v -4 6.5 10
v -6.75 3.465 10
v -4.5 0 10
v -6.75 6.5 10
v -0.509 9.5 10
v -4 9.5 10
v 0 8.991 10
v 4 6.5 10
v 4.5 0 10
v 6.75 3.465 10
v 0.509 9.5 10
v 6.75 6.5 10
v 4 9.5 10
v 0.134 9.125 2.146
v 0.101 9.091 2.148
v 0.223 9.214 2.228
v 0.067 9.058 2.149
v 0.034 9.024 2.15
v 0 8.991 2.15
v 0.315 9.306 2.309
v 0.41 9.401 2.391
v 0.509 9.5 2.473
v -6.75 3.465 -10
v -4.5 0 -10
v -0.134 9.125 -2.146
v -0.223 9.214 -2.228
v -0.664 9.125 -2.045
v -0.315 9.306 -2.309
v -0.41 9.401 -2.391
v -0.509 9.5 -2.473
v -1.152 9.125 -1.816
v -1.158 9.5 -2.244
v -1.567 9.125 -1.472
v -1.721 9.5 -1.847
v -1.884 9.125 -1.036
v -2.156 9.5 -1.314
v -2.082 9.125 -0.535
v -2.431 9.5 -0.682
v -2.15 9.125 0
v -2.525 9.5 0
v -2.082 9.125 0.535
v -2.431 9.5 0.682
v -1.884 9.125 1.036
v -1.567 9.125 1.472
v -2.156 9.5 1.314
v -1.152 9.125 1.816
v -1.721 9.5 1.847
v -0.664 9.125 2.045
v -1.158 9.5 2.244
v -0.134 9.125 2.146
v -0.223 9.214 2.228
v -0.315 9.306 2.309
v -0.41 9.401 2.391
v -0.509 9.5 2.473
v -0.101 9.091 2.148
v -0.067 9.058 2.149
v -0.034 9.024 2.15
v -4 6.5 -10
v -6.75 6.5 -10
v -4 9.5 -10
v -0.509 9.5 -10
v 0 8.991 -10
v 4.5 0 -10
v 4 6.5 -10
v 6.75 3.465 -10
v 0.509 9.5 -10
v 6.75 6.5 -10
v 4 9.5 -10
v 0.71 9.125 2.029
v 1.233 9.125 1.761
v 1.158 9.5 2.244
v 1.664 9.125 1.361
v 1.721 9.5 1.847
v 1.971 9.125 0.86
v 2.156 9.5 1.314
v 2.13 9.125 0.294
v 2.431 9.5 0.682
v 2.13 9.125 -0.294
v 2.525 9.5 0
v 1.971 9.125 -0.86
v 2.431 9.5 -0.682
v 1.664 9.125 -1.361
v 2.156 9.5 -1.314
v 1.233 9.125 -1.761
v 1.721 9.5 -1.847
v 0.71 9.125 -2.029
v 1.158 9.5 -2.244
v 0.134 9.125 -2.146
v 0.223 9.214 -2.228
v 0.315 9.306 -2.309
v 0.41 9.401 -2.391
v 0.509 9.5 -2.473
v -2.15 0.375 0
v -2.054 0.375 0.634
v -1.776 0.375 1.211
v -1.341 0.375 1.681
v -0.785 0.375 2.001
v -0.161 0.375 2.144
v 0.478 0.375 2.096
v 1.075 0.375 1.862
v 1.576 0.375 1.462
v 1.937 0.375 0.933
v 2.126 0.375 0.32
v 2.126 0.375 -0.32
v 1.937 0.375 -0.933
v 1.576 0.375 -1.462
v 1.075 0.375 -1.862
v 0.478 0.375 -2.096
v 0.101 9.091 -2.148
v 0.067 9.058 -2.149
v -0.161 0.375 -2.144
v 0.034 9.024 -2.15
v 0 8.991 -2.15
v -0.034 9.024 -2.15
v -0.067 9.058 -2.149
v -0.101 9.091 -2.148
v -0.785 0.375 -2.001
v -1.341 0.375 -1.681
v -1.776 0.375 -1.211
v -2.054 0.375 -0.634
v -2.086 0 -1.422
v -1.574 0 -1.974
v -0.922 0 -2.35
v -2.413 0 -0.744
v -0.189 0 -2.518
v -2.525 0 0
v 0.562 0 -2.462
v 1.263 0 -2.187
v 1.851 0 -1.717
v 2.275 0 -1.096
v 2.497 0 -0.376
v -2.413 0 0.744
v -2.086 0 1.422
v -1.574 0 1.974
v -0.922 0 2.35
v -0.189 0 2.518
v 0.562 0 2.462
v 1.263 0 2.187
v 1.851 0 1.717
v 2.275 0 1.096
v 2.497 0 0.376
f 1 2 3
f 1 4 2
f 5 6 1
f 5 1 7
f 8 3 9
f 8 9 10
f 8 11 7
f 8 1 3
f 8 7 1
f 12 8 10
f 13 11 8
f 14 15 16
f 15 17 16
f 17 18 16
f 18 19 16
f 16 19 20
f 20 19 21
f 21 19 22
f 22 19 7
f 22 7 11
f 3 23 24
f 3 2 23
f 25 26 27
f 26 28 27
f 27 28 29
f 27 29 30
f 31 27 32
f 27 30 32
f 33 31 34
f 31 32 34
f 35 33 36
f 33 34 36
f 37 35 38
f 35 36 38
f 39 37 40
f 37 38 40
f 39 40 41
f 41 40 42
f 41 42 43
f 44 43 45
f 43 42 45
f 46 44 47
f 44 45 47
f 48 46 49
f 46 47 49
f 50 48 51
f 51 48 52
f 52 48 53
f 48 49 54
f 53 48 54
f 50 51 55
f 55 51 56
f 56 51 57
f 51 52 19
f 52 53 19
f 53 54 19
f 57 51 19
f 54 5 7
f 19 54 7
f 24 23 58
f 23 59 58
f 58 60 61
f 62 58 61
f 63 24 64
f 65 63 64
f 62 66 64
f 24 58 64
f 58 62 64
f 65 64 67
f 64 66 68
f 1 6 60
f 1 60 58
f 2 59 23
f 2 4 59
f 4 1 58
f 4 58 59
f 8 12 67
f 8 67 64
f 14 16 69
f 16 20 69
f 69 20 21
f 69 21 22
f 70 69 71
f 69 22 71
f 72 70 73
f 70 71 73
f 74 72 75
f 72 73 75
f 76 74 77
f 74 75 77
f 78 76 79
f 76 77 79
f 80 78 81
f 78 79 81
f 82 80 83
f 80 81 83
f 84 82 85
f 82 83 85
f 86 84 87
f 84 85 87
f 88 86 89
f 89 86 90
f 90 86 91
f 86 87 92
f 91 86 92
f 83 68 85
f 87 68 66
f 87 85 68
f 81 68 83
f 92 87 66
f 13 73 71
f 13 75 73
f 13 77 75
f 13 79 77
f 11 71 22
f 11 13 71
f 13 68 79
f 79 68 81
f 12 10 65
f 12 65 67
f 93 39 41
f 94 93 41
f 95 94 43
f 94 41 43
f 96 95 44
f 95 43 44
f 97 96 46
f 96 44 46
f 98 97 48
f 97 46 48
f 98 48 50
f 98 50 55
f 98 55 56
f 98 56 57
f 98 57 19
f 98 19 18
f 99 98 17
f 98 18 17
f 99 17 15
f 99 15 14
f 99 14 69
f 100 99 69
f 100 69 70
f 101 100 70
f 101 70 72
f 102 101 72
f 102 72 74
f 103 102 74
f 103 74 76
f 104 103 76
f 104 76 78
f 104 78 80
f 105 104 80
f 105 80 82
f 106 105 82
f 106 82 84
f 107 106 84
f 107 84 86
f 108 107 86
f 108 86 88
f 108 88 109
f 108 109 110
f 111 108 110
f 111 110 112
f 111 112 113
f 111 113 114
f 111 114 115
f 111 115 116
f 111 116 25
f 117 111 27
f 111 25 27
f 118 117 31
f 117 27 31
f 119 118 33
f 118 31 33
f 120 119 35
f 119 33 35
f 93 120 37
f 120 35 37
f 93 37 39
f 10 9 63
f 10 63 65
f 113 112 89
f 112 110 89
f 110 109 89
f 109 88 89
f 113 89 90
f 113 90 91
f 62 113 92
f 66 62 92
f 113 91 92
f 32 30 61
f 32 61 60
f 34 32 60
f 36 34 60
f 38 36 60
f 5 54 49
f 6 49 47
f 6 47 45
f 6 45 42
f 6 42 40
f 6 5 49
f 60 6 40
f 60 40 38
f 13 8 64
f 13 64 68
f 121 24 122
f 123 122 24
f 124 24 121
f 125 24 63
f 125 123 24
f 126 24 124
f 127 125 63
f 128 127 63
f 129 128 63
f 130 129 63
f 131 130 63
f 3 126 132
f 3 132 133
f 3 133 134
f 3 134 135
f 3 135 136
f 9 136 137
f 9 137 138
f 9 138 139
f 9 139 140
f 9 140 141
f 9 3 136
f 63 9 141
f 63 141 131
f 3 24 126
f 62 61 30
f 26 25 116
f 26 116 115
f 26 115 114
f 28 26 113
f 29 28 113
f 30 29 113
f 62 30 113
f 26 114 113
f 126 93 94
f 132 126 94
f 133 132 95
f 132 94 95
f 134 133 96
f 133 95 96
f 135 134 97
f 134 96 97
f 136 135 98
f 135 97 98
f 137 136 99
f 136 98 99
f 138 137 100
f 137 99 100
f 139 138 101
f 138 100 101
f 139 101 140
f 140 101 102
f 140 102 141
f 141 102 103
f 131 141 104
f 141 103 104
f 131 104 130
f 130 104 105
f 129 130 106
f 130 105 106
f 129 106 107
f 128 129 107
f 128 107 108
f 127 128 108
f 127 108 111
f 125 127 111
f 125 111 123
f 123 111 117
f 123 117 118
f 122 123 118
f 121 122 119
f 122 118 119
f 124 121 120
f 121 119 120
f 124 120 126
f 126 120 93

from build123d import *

# Parameters (mm, degrees)
EXTRUDE_1_DEPTH     = 10
SKETCH_2_R          = 2.15
CUT_EXTRUDE_1_DEPTH = 16.356187678
CUT_EXTRUDE_2_DEPTH = 10
CHAMFER_1_SIZE      = 0.375


with BuildPart() as part:
    # 草图1 → 凸台-拉伸1 (new, symmetric)
    with BuildSketch(Plane.XY):
        Polygon((-4.5, 0), (4.5, 0), (6.75, 3.464696169), (6.75, 6.5), (4, 6.5), (4, 9.5), (-4, 9.5), (-4, 6.5), (-6.75, 6.5), (-6.75, 3.464696169), align=None)
    extrude(amount=EXTRUDE_1_DEPTH, both=True)

    # 草图2 → 切除-拉伸1 (cut, through all)
    with BuildSketch(Plane(origin=(0, 9.5, 0), x_dir=(1, 0, 0), z_dir=(0, 1, 0))):
        with Locations(Location((0, 0, 0), (0, 0, 180))):
            Circle(SKETCH_2_R)
    extrude(amount=-CUT_EXTRUDE_1_DEPTH, mode=Mode.SUBTRACT)

    # 草图3 → 切除-拉伸2 (cut, symmetric)
    with BuildSketch(Plane.XY):
        Polygon((-0.509116882, 9.5), (0, 8.990883118), (0.509116882, 9.5), (0, 10.009116882), align=None)
    extrude(amount=CUT_EXTRUDE_2_DEPTH, both=True, mode=Mode.SUBTRACT)

    # 倒角1
    chamfer_1_edges = [part.edges().sort_by_distance(p)[0] for p in [
        (2.15, 0, 0),
        (2.15, 9.5, 0),
        (-1.690724889, 9.5, -1.32813755),
    ]]
    chamfer(chamfer_1_edges, length=CHAMFER_1_SIZE)


solid = part.part
